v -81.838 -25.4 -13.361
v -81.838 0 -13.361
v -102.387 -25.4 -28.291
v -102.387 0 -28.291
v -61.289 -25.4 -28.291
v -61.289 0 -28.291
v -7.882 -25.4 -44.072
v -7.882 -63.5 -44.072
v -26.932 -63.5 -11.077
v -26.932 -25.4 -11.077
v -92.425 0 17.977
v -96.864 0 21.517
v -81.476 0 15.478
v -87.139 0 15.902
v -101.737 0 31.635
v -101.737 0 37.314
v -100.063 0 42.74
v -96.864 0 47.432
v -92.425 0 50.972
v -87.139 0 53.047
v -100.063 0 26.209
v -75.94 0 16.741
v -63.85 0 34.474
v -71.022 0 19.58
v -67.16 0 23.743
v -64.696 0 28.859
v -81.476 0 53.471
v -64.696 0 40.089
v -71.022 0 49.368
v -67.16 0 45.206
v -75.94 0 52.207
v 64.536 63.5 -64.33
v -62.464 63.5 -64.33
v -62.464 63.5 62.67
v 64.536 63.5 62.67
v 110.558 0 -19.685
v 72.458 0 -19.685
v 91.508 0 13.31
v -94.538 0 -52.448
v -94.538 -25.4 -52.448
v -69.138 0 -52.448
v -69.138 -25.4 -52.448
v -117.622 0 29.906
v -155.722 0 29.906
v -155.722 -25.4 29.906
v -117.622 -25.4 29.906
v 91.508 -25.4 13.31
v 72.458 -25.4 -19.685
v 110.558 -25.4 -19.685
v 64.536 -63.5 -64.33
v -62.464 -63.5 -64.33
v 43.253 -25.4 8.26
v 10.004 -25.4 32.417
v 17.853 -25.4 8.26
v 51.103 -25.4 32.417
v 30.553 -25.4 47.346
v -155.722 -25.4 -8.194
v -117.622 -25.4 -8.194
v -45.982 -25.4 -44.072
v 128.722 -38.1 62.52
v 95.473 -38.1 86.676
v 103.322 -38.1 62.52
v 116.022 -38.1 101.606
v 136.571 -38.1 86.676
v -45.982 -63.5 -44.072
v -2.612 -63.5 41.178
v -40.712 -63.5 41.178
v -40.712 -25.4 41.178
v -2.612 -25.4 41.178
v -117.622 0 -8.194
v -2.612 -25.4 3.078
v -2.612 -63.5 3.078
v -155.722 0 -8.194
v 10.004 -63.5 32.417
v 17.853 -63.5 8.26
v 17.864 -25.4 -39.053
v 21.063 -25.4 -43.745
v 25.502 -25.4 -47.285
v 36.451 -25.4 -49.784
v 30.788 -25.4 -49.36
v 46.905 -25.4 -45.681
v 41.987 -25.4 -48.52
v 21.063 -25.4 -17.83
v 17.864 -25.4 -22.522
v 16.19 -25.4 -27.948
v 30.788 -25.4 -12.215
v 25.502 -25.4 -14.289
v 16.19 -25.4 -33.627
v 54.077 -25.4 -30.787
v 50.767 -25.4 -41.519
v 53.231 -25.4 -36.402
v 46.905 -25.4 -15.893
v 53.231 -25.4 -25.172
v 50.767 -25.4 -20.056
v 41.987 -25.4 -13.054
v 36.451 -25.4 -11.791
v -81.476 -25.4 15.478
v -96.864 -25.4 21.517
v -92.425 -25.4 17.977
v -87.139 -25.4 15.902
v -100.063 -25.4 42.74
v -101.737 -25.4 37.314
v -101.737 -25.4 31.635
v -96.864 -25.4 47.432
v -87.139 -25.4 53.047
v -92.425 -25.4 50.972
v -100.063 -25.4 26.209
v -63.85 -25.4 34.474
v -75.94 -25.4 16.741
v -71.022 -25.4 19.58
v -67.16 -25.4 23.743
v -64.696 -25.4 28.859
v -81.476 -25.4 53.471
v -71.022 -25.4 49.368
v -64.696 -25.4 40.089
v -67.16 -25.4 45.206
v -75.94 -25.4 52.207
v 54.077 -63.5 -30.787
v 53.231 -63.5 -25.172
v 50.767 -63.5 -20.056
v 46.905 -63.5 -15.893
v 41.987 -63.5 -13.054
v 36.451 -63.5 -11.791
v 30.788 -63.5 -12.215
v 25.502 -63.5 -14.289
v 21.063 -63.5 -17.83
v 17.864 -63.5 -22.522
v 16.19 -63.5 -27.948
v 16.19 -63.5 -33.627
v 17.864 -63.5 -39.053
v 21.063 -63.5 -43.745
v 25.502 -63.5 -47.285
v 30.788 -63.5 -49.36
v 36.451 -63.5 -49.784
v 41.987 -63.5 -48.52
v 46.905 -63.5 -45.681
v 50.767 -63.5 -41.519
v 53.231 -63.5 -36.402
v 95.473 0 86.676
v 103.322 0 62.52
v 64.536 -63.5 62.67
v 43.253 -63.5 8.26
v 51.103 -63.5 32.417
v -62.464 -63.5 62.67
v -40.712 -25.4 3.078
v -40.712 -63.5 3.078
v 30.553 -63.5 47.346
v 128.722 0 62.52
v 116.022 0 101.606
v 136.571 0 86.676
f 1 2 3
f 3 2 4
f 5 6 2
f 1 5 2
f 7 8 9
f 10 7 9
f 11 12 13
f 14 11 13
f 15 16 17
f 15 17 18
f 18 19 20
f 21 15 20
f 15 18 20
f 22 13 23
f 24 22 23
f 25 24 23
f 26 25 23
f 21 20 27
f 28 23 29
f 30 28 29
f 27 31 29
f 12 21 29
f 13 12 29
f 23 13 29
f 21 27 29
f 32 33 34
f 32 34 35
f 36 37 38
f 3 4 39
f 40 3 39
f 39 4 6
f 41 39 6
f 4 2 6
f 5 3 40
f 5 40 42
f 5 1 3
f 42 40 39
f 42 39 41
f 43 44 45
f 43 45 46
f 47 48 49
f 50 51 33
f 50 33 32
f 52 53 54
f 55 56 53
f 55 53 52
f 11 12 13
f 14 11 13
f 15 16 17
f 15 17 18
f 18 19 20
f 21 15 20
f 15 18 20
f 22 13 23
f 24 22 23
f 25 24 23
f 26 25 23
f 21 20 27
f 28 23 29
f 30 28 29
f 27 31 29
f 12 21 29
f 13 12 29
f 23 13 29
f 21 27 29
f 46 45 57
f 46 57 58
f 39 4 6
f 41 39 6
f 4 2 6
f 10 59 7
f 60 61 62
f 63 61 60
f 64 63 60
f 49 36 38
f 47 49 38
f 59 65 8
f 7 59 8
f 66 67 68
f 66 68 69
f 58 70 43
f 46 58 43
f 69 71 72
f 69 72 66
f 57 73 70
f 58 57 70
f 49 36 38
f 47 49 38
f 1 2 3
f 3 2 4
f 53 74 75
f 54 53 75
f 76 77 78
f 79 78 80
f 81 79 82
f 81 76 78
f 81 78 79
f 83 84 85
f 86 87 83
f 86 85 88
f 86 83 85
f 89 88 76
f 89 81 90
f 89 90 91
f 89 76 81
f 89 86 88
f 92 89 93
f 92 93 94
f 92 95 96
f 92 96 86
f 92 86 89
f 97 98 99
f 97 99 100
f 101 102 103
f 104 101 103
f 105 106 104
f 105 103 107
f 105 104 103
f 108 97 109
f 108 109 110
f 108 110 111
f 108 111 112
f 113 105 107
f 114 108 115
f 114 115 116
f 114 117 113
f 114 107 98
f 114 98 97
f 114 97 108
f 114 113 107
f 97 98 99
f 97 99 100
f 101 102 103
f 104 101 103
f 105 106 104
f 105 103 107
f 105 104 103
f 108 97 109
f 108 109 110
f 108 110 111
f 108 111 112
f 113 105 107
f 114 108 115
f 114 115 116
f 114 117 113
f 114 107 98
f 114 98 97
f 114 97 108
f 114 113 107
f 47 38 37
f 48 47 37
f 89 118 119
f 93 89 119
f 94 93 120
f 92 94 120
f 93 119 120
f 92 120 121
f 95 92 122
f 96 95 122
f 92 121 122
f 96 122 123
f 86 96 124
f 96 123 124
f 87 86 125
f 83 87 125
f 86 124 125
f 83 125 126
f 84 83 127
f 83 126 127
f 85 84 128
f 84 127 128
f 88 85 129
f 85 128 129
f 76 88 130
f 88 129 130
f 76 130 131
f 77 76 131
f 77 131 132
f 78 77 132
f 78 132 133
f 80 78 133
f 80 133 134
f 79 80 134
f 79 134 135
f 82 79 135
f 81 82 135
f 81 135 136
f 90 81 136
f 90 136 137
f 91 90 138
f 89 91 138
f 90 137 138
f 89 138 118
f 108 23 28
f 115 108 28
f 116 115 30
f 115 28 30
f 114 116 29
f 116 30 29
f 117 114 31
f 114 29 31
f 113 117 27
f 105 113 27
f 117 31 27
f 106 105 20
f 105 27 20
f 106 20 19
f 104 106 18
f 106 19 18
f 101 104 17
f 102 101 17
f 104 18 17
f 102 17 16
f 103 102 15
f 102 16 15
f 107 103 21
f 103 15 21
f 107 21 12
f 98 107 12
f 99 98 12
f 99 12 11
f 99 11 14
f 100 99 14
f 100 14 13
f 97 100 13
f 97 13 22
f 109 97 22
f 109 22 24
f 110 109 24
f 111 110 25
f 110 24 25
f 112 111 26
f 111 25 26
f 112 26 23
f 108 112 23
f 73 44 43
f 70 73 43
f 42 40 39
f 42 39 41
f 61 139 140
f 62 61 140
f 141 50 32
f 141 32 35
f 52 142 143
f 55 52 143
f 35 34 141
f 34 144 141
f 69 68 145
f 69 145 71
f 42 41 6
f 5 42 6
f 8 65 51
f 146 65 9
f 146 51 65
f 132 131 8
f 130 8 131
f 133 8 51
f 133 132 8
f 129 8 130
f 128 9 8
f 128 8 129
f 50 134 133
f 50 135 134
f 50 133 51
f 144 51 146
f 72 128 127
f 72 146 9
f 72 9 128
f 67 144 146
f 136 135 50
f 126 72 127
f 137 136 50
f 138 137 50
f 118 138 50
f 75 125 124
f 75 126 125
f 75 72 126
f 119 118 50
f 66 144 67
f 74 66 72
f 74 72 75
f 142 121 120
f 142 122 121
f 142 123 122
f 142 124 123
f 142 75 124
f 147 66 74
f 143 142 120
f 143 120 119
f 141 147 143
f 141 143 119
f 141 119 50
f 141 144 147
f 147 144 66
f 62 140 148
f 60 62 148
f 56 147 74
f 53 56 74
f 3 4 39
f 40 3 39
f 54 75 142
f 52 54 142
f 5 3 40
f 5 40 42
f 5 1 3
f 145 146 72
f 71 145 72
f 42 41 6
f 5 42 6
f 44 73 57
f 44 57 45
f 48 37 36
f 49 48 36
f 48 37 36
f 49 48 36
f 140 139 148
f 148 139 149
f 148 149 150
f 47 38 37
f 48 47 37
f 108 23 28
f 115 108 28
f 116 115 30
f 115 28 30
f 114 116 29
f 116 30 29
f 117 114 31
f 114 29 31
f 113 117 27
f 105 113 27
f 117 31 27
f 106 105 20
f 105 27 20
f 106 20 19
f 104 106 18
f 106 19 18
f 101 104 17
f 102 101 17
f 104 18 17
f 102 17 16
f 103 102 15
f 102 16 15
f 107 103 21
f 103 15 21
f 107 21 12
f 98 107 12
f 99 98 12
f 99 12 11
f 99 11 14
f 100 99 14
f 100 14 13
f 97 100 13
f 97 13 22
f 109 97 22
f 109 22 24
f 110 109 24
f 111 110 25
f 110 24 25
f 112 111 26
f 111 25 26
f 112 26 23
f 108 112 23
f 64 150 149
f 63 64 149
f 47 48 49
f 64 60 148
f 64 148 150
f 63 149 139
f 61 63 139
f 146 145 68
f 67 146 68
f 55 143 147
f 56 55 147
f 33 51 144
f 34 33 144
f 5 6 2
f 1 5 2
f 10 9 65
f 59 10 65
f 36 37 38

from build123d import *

# Parameters (mm, degrees)
F0_W      = 127
F0_H      = 127
F1_DEPTH  = 63.5
F2_W      = 38.1
F2_H      = 38.1
F3_DEPTH  = 38.1
F5_DEPTH  = 38.1
F6_R      = 19.05
F8_DEPTH  = 38.1
F9_DEPTH  = 38.1
F10_W     = 38.1
F10_H     = 38.1
F11_DEPTH = 25.4
F13_DEPTH = 25.4
F12_R     = 19.05
F14_DEPTH = 25.4
F16_DEPTH = 38.1


# Not quite as in the source:
# - a feature of the source that left no trace in its solid (it failed there, or was rolled back) is left out
# - a feature names something its author has since deleted; it is built from what else it names


with BuildPart() as f1:
    # F0 (on Front) → F1 (new body, symmetric)
    with BuildSketch(Plane.XZ):
        with Locations((1.0360684865, -0.8295979351)):
            Rectangle(F0_W, F0_H)
    extrude(amount=F1_DEPTH, both=True)

    # F2 (on face) → F3 (cut)
    with BuildSketch(Plane.XZ.offset(63.5)):
        with Locations((-21.6616940452, 22.1276779154)):
            Rectangle(F2_W, F2_H)
    extrude(amount=-F3_DEPTH, mode=Mode.SUBTRACT)

    # F4 (on face) → F5 (cut)
    with BuildSketch(Plane.XZ.offset(63.5)):
        Polygon((43.2534851908, 8.2597824623), (51.102516848, 32.4166179762), (30.5534851908, 47.3463633845), (10.0044535337, 32.4166179762), (17.8534851908, 8.2597824623), align=None)
    extrude(amount=-F5_DEPTH, mode=Mode.SUBTRACT)

    # F6 (on face) → F8 (cut)
    with BuildSketch(Plane.XZ.offset(63.5)):
        with Locations((35.0274220109, -30.7872574776)):
            Circle(F6_R)
        Polygon((-26.9323371144, -11.076669144), (-45.9823371144, -44.0722370282), (-7.8823371144, -44.0722370282), align=None)
    extrude(amount=-F8_DEPTH, mode=Mode.SUBTRACT)

    # F6 (on face) → F9 (cut)
    with BuildSketch(Plane.XZ.offset(63.5)):
        with Locations((35.0274220109, -30.7872574776)):
            Circle(F6_R)
        Polygon((-26.9323371144, -11.076669144), (-45.9823371144, -44.0722370282), (-7.8823371144, -44.0722370282), align=None)
    extrude(amount=-F9_DEPTH, mode=Mode.SUBTRACT)


with BuildPart() as f11:
    # F10 (on Front) → F11 (new body)
    with BuildSketch(Plane.XZ):
        with Locations((-136.6716623306, 10.8564948447)):
            Rectangle(F10_W, F10_H)
    extrude(amount=F11_DEPTH)


with BuildPart() as f13:
    # F12 (on Front) → F13 (new body)
    with BuildSketch(Plane.XZ):
        Polygon((-102.3873424113, -28.2908431806), (-94.5383107541, -52.4476786945), (-69.1383107541, -52.4476786945), (-61.289279097, -28.2908431806), (-81.8383107541, -13.3610977723), align=None)
    extrude(amount=F13_DEPTH)


with BuildPart() as f13b:
    # F12 (on Front) → F13, piece 2 (new body)
    with BuildSketch(Plane.XZ):
        with Locations((-82.8998610377, 34.4743542373)):
            Circle(F12_R)
    extrude(amount=F13_DEPTH)


with BuildPart() as f13c:
    # F12 (on Front) → F13, piece 3 (new body)
    with BuildSketch(Plane.XZ):
        Polygon((91.5077158689, 13.3103162459), (72.4577158689, -19.6852516383), (110.5577158689, -19.6852516383), align=None)
    extrude(amount=F13_DEPTH)


with BuildPart() as f14:
    # F12 (on Front) → F14 (new body)
    with BuildSketch(Plane.XZ):
        Polygon((-102.3873424113, -28.2908431806), (-94.5383107541, -52.4476786945), (-69.1383107541, -52.4476786945), (-61.289279097, -28.2908431806), (-81.8383107541, -13.3610977723), align=None)
    extrude(amount=F14_DEPTH)


with BuildPart() as f14b:
    # F12 (on Front) → F14, piece 2 (new body)
    with BuildSketch(Plane.XZ):
        with Locations((-82.8998610377, 34.4743542373)):
            Circle(F12_R)
    extrude(amount=F14_DEPTH)


with BuildPart() as f14c:
    # F12 (on Front) → F14, piece 3 (new body)
    with BuildSketch(Plane.XZ):
        Polygon((91.5077158689, 13.3103162459), (72.4577158689, -19.6852516383), (110.5577158689, -19.6852516383), align=None)
    extrude(amount=F14_DEPTH)


with BuildPart() as f16:
    # F15 (on Front) → F16 (new body)
    with BuildSketch(Plane.XZ):
        Polygon((128.7221174359, 62.5196497987), (136.5711490931, 86.6764853125), (116.0221174359, 101.6062307208), (95.4730857788, 86.6764853125), (103.3221174359, 62.5196497987), align=None)
    extrude(amount=F16_DEPTH)


solid = Compound([f1.part, f11.part, f13.part, f13b.part, f13c.part, f14.part, f14b.part, f14c.part, f16.part])
